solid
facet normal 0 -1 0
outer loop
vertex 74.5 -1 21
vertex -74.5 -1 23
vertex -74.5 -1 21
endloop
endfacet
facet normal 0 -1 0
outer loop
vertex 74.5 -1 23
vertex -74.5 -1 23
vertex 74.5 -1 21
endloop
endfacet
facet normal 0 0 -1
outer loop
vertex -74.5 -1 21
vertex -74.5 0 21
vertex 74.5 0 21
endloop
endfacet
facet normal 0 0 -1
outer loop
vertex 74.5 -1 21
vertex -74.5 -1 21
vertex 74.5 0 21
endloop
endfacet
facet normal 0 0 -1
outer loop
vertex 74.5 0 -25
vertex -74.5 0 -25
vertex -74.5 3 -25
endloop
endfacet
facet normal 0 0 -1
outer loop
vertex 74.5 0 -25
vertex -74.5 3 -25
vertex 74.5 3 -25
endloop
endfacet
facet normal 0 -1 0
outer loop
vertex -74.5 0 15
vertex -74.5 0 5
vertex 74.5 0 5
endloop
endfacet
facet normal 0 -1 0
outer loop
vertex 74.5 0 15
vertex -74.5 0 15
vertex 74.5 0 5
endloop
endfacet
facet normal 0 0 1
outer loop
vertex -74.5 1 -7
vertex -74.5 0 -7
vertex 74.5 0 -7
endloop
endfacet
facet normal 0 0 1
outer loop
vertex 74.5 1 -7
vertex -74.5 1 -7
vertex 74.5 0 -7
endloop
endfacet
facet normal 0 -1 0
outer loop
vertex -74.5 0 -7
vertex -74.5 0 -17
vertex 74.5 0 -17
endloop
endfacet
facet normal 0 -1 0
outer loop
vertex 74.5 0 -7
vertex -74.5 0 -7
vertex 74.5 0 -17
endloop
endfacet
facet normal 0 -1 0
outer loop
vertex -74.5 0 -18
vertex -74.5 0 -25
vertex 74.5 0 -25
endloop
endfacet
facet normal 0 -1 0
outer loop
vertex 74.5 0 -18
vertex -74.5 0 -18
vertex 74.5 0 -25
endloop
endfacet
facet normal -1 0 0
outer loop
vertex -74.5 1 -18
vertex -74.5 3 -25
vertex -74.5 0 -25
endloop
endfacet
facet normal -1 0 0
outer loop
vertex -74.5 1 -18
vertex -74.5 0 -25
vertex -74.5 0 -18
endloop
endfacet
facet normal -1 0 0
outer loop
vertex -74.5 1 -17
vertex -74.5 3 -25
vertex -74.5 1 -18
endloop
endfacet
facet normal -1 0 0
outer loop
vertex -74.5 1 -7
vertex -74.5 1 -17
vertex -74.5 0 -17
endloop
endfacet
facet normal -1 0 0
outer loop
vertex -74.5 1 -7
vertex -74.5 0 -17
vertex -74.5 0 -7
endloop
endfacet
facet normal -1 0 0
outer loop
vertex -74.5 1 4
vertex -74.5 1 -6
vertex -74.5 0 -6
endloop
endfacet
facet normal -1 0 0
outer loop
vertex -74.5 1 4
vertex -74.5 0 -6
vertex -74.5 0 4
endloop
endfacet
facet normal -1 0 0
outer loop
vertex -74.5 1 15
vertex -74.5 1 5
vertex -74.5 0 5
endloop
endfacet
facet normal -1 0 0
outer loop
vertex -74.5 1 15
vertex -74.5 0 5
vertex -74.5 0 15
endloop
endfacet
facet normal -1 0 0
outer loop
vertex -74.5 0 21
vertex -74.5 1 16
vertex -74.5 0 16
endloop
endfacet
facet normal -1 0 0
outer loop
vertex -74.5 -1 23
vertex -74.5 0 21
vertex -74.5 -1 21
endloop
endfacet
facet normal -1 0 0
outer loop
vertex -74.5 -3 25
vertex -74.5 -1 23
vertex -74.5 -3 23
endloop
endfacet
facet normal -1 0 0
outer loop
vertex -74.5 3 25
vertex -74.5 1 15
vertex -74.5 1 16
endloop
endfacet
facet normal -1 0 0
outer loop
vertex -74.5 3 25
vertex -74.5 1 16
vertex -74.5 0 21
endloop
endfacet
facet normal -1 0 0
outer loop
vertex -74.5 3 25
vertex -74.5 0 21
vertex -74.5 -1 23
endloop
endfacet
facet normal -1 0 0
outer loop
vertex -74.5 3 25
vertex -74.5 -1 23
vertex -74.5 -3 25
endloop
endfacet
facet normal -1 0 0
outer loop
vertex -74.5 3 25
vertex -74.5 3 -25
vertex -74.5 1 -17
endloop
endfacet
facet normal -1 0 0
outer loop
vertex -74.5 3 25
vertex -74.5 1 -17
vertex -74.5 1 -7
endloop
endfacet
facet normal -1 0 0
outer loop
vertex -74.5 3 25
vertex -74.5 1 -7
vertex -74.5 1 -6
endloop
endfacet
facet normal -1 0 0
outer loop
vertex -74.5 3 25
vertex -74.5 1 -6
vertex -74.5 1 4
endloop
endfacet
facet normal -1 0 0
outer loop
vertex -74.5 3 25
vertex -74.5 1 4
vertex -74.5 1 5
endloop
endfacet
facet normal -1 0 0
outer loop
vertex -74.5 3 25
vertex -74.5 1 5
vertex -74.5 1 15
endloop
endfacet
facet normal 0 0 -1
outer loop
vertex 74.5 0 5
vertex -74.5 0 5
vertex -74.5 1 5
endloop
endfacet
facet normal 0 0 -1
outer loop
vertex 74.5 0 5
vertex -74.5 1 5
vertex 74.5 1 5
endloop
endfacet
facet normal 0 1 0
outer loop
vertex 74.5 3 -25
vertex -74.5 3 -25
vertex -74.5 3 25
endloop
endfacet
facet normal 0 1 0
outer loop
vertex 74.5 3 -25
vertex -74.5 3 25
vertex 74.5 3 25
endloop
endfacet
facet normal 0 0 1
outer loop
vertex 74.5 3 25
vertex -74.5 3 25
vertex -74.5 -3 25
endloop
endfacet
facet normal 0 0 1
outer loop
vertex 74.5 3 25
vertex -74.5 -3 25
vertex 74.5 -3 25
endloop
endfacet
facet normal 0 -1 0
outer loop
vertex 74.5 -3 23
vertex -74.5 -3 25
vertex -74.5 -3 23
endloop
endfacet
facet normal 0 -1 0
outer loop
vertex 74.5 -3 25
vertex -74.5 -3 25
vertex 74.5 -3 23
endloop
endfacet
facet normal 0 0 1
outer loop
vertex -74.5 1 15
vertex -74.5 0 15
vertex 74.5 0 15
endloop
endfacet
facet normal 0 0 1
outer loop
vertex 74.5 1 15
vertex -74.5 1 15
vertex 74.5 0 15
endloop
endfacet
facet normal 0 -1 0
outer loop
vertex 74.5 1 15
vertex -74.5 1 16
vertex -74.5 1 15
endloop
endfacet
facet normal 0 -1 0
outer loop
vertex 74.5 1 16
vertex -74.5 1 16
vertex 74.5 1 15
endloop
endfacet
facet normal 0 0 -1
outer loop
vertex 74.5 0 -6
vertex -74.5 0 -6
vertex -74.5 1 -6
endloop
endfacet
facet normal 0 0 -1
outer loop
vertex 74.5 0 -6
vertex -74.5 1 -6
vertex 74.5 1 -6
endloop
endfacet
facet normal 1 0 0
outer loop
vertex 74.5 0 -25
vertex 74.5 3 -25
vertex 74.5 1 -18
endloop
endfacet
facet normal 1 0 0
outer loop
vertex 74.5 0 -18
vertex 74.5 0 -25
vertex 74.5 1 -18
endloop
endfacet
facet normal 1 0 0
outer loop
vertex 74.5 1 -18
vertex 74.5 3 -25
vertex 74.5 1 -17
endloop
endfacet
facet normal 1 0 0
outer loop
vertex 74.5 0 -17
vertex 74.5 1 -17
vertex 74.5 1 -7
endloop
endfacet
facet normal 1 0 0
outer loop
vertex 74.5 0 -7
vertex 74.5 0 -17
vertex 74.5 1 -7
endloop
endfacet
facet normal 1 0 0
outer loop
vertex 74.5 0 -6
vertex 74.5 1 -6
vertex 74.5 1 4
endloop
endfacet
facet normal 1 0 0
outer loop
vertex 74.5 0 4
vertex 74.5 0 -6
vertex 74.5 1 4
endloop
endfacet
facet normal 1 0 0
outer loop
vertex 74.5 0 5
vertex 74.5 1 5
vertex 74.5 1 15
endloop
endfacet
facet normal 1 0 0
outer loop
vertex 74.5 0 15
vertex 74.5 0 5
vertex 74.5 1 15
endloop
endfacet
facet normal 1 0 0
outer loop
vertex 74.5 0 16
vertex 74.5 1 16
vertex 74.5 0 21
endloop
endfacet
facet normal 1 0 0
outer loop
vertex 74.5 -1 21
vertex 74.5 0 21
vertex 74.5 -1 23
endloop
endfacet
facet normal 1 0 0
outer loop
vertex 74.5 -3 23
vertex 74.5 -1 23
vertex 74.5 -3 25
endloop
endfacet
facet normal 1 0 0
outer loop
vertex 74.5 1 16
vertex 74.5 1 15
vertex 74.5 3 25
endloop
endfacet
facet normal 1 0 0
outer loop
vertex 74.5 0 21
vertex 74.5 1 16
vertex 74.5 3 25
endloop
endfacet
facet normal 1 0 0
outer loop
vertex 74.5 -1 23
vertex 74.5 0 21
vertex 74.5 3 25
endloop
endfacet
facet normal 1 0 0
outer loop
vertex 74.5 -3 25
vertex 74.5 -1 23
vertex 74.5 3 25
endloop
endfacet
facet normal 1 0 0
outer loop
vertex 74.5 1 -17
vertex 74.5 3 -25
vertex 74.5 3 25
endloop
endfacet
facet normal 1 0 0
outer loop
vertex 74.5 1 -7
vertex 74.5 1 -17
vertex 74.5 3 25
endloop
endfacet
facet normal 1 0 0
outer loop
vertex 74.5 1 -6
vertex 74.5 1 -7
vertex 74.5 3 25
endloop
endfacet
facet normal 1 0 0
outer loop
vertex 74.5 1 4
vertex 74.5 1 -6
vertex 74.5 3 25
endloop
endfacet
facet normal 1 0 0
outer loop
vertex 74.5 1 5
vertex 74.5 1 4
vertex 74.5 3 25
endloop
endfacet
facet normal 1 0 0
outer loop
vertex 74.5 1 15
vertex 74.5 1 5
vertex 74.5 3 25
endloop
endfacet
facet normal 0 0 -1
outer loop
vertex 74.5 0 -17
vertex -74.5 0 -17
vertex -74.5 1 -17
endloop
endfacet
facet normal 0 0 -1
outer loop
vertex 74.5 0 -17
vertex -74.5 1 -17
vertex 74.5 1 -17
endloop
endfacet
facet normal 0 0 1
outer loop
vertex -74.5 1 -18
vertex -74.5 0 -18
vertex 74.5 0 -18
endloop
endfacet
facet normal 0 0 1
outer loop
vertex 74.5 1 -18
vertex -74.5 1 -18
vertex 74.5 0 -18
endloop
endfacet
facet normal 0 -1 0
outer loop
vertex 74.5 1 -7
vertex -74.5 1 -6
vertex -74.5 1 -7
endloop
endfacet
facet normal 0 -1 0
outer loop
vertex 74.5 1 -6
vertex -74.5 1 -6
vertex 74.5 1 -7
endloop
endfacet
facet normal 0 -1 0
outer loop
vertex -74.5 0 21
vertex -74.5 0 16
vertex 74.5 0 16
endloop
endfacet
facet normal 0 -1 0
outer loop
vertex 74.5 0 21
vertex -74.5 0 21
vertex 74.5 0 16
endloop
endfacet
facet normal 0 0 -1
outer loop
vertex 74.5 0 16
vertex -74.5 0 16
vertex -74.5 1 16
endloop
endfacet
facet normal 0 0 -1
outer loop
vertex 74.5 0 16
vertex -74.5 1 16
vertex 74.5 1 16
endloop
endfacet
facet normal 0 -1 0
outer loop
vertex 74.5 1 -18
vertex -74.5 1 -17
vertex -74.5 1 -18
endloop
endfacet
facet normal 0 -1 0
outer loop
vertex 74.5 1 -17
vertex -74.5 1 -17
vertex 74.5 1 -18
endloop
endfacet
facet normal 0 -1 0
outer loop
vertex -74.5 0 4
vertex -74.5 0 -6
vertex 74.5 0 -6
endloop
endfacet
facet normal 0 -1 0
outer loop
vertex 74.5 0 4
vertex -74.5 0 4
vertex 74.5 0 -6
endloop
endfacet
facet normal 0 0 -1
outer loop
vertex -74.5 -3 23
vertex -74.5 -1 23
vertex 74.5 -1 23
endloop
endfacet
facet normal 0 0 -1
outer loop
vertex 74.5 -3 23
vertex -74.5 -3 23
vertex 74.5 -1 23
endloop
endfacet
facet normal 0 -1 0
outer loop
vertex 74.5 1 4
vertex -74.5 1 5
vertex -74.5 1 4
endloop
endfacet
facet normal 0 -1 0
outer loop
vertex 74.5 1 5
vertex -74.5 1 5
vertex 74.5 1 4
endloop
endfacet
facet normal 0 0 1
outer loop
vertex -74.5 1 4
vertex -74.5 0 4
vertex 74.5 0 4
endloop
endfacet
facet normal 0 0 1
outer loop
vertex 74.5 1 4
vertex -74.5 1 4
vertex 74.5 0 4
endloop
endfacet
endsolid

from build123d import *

# Parameters (mm, degrees)
SKETCH1_W           = 149
SKETCH1_H           = 50
BOSS_EXTRUDE1_DEPTH = 3
SKETCH2_W           = 149
SKETCH2_H           = 1
CUT_EXTRUDE1_DEPTH  = 1
SKETCH3_W           = 149
SKETCH3_H           = 4
BOSS_EXTRUDE2_DEPTH = 1
SKETCH4_W           = 149
SKETCH4_H           = 2
BOSS_EXTRUDE3_DEPTH = 2


with BuildPart() as part:
    # Sketch1 → Boss-Extrude1 (new body)
    with BuildSketch(Plane(origin=(0, 0, 0), x_dir=(1, 0, 0), z_dir=(0, 1, 0))):
        Rectangle(SKETCH1_W, SKETCH1_H)
    extrude(amount=BOSS_EXTRUDE1_DEPTH)

    # Sketch2 → Cut-Extrude1 (cut)
    with BuildSketch(Plane.XZ):
        with Locations((0, -17.5)):
            Rectangle(SKETCH2_W, SKETCH2_H)
        with Locations((0, -6.5)):
            Rectangle(SKETCH2_W, SKETCH2_H)
        with Locations((0, 4.5)):
            Rectangle(SKETCH2_W, SKETCH2_H)
        with Locations((0, 15.5)):
            Rectangle(SKETCH2_W, SKETCH2_H)
    extrude(amount=-CUT_EXTRUDE1_DEPTH, mode=Mode.SUBTRACT)

    # Sketch3 → Boss-Extrude2 (add)
    with BuildSketch(Plane.XZ):
        with Locations((0, 23)):
            Rectangle(SKETCH3_W, SKETCH3_H)
    extrude(amount=BOSS_EXTRUDE2_DEPTH)

    # Sketch4 → Boss-Extrude3 (add)
    with BuildSketch(Plane.XZ.offset(1)):
        with Locations((0, 24)):
            Rectangle(SKETCH4_W, SKETCH4_H)
    extrude(amount=BOSS_EXTRUDE3_DEPTH)


solid = part.part
